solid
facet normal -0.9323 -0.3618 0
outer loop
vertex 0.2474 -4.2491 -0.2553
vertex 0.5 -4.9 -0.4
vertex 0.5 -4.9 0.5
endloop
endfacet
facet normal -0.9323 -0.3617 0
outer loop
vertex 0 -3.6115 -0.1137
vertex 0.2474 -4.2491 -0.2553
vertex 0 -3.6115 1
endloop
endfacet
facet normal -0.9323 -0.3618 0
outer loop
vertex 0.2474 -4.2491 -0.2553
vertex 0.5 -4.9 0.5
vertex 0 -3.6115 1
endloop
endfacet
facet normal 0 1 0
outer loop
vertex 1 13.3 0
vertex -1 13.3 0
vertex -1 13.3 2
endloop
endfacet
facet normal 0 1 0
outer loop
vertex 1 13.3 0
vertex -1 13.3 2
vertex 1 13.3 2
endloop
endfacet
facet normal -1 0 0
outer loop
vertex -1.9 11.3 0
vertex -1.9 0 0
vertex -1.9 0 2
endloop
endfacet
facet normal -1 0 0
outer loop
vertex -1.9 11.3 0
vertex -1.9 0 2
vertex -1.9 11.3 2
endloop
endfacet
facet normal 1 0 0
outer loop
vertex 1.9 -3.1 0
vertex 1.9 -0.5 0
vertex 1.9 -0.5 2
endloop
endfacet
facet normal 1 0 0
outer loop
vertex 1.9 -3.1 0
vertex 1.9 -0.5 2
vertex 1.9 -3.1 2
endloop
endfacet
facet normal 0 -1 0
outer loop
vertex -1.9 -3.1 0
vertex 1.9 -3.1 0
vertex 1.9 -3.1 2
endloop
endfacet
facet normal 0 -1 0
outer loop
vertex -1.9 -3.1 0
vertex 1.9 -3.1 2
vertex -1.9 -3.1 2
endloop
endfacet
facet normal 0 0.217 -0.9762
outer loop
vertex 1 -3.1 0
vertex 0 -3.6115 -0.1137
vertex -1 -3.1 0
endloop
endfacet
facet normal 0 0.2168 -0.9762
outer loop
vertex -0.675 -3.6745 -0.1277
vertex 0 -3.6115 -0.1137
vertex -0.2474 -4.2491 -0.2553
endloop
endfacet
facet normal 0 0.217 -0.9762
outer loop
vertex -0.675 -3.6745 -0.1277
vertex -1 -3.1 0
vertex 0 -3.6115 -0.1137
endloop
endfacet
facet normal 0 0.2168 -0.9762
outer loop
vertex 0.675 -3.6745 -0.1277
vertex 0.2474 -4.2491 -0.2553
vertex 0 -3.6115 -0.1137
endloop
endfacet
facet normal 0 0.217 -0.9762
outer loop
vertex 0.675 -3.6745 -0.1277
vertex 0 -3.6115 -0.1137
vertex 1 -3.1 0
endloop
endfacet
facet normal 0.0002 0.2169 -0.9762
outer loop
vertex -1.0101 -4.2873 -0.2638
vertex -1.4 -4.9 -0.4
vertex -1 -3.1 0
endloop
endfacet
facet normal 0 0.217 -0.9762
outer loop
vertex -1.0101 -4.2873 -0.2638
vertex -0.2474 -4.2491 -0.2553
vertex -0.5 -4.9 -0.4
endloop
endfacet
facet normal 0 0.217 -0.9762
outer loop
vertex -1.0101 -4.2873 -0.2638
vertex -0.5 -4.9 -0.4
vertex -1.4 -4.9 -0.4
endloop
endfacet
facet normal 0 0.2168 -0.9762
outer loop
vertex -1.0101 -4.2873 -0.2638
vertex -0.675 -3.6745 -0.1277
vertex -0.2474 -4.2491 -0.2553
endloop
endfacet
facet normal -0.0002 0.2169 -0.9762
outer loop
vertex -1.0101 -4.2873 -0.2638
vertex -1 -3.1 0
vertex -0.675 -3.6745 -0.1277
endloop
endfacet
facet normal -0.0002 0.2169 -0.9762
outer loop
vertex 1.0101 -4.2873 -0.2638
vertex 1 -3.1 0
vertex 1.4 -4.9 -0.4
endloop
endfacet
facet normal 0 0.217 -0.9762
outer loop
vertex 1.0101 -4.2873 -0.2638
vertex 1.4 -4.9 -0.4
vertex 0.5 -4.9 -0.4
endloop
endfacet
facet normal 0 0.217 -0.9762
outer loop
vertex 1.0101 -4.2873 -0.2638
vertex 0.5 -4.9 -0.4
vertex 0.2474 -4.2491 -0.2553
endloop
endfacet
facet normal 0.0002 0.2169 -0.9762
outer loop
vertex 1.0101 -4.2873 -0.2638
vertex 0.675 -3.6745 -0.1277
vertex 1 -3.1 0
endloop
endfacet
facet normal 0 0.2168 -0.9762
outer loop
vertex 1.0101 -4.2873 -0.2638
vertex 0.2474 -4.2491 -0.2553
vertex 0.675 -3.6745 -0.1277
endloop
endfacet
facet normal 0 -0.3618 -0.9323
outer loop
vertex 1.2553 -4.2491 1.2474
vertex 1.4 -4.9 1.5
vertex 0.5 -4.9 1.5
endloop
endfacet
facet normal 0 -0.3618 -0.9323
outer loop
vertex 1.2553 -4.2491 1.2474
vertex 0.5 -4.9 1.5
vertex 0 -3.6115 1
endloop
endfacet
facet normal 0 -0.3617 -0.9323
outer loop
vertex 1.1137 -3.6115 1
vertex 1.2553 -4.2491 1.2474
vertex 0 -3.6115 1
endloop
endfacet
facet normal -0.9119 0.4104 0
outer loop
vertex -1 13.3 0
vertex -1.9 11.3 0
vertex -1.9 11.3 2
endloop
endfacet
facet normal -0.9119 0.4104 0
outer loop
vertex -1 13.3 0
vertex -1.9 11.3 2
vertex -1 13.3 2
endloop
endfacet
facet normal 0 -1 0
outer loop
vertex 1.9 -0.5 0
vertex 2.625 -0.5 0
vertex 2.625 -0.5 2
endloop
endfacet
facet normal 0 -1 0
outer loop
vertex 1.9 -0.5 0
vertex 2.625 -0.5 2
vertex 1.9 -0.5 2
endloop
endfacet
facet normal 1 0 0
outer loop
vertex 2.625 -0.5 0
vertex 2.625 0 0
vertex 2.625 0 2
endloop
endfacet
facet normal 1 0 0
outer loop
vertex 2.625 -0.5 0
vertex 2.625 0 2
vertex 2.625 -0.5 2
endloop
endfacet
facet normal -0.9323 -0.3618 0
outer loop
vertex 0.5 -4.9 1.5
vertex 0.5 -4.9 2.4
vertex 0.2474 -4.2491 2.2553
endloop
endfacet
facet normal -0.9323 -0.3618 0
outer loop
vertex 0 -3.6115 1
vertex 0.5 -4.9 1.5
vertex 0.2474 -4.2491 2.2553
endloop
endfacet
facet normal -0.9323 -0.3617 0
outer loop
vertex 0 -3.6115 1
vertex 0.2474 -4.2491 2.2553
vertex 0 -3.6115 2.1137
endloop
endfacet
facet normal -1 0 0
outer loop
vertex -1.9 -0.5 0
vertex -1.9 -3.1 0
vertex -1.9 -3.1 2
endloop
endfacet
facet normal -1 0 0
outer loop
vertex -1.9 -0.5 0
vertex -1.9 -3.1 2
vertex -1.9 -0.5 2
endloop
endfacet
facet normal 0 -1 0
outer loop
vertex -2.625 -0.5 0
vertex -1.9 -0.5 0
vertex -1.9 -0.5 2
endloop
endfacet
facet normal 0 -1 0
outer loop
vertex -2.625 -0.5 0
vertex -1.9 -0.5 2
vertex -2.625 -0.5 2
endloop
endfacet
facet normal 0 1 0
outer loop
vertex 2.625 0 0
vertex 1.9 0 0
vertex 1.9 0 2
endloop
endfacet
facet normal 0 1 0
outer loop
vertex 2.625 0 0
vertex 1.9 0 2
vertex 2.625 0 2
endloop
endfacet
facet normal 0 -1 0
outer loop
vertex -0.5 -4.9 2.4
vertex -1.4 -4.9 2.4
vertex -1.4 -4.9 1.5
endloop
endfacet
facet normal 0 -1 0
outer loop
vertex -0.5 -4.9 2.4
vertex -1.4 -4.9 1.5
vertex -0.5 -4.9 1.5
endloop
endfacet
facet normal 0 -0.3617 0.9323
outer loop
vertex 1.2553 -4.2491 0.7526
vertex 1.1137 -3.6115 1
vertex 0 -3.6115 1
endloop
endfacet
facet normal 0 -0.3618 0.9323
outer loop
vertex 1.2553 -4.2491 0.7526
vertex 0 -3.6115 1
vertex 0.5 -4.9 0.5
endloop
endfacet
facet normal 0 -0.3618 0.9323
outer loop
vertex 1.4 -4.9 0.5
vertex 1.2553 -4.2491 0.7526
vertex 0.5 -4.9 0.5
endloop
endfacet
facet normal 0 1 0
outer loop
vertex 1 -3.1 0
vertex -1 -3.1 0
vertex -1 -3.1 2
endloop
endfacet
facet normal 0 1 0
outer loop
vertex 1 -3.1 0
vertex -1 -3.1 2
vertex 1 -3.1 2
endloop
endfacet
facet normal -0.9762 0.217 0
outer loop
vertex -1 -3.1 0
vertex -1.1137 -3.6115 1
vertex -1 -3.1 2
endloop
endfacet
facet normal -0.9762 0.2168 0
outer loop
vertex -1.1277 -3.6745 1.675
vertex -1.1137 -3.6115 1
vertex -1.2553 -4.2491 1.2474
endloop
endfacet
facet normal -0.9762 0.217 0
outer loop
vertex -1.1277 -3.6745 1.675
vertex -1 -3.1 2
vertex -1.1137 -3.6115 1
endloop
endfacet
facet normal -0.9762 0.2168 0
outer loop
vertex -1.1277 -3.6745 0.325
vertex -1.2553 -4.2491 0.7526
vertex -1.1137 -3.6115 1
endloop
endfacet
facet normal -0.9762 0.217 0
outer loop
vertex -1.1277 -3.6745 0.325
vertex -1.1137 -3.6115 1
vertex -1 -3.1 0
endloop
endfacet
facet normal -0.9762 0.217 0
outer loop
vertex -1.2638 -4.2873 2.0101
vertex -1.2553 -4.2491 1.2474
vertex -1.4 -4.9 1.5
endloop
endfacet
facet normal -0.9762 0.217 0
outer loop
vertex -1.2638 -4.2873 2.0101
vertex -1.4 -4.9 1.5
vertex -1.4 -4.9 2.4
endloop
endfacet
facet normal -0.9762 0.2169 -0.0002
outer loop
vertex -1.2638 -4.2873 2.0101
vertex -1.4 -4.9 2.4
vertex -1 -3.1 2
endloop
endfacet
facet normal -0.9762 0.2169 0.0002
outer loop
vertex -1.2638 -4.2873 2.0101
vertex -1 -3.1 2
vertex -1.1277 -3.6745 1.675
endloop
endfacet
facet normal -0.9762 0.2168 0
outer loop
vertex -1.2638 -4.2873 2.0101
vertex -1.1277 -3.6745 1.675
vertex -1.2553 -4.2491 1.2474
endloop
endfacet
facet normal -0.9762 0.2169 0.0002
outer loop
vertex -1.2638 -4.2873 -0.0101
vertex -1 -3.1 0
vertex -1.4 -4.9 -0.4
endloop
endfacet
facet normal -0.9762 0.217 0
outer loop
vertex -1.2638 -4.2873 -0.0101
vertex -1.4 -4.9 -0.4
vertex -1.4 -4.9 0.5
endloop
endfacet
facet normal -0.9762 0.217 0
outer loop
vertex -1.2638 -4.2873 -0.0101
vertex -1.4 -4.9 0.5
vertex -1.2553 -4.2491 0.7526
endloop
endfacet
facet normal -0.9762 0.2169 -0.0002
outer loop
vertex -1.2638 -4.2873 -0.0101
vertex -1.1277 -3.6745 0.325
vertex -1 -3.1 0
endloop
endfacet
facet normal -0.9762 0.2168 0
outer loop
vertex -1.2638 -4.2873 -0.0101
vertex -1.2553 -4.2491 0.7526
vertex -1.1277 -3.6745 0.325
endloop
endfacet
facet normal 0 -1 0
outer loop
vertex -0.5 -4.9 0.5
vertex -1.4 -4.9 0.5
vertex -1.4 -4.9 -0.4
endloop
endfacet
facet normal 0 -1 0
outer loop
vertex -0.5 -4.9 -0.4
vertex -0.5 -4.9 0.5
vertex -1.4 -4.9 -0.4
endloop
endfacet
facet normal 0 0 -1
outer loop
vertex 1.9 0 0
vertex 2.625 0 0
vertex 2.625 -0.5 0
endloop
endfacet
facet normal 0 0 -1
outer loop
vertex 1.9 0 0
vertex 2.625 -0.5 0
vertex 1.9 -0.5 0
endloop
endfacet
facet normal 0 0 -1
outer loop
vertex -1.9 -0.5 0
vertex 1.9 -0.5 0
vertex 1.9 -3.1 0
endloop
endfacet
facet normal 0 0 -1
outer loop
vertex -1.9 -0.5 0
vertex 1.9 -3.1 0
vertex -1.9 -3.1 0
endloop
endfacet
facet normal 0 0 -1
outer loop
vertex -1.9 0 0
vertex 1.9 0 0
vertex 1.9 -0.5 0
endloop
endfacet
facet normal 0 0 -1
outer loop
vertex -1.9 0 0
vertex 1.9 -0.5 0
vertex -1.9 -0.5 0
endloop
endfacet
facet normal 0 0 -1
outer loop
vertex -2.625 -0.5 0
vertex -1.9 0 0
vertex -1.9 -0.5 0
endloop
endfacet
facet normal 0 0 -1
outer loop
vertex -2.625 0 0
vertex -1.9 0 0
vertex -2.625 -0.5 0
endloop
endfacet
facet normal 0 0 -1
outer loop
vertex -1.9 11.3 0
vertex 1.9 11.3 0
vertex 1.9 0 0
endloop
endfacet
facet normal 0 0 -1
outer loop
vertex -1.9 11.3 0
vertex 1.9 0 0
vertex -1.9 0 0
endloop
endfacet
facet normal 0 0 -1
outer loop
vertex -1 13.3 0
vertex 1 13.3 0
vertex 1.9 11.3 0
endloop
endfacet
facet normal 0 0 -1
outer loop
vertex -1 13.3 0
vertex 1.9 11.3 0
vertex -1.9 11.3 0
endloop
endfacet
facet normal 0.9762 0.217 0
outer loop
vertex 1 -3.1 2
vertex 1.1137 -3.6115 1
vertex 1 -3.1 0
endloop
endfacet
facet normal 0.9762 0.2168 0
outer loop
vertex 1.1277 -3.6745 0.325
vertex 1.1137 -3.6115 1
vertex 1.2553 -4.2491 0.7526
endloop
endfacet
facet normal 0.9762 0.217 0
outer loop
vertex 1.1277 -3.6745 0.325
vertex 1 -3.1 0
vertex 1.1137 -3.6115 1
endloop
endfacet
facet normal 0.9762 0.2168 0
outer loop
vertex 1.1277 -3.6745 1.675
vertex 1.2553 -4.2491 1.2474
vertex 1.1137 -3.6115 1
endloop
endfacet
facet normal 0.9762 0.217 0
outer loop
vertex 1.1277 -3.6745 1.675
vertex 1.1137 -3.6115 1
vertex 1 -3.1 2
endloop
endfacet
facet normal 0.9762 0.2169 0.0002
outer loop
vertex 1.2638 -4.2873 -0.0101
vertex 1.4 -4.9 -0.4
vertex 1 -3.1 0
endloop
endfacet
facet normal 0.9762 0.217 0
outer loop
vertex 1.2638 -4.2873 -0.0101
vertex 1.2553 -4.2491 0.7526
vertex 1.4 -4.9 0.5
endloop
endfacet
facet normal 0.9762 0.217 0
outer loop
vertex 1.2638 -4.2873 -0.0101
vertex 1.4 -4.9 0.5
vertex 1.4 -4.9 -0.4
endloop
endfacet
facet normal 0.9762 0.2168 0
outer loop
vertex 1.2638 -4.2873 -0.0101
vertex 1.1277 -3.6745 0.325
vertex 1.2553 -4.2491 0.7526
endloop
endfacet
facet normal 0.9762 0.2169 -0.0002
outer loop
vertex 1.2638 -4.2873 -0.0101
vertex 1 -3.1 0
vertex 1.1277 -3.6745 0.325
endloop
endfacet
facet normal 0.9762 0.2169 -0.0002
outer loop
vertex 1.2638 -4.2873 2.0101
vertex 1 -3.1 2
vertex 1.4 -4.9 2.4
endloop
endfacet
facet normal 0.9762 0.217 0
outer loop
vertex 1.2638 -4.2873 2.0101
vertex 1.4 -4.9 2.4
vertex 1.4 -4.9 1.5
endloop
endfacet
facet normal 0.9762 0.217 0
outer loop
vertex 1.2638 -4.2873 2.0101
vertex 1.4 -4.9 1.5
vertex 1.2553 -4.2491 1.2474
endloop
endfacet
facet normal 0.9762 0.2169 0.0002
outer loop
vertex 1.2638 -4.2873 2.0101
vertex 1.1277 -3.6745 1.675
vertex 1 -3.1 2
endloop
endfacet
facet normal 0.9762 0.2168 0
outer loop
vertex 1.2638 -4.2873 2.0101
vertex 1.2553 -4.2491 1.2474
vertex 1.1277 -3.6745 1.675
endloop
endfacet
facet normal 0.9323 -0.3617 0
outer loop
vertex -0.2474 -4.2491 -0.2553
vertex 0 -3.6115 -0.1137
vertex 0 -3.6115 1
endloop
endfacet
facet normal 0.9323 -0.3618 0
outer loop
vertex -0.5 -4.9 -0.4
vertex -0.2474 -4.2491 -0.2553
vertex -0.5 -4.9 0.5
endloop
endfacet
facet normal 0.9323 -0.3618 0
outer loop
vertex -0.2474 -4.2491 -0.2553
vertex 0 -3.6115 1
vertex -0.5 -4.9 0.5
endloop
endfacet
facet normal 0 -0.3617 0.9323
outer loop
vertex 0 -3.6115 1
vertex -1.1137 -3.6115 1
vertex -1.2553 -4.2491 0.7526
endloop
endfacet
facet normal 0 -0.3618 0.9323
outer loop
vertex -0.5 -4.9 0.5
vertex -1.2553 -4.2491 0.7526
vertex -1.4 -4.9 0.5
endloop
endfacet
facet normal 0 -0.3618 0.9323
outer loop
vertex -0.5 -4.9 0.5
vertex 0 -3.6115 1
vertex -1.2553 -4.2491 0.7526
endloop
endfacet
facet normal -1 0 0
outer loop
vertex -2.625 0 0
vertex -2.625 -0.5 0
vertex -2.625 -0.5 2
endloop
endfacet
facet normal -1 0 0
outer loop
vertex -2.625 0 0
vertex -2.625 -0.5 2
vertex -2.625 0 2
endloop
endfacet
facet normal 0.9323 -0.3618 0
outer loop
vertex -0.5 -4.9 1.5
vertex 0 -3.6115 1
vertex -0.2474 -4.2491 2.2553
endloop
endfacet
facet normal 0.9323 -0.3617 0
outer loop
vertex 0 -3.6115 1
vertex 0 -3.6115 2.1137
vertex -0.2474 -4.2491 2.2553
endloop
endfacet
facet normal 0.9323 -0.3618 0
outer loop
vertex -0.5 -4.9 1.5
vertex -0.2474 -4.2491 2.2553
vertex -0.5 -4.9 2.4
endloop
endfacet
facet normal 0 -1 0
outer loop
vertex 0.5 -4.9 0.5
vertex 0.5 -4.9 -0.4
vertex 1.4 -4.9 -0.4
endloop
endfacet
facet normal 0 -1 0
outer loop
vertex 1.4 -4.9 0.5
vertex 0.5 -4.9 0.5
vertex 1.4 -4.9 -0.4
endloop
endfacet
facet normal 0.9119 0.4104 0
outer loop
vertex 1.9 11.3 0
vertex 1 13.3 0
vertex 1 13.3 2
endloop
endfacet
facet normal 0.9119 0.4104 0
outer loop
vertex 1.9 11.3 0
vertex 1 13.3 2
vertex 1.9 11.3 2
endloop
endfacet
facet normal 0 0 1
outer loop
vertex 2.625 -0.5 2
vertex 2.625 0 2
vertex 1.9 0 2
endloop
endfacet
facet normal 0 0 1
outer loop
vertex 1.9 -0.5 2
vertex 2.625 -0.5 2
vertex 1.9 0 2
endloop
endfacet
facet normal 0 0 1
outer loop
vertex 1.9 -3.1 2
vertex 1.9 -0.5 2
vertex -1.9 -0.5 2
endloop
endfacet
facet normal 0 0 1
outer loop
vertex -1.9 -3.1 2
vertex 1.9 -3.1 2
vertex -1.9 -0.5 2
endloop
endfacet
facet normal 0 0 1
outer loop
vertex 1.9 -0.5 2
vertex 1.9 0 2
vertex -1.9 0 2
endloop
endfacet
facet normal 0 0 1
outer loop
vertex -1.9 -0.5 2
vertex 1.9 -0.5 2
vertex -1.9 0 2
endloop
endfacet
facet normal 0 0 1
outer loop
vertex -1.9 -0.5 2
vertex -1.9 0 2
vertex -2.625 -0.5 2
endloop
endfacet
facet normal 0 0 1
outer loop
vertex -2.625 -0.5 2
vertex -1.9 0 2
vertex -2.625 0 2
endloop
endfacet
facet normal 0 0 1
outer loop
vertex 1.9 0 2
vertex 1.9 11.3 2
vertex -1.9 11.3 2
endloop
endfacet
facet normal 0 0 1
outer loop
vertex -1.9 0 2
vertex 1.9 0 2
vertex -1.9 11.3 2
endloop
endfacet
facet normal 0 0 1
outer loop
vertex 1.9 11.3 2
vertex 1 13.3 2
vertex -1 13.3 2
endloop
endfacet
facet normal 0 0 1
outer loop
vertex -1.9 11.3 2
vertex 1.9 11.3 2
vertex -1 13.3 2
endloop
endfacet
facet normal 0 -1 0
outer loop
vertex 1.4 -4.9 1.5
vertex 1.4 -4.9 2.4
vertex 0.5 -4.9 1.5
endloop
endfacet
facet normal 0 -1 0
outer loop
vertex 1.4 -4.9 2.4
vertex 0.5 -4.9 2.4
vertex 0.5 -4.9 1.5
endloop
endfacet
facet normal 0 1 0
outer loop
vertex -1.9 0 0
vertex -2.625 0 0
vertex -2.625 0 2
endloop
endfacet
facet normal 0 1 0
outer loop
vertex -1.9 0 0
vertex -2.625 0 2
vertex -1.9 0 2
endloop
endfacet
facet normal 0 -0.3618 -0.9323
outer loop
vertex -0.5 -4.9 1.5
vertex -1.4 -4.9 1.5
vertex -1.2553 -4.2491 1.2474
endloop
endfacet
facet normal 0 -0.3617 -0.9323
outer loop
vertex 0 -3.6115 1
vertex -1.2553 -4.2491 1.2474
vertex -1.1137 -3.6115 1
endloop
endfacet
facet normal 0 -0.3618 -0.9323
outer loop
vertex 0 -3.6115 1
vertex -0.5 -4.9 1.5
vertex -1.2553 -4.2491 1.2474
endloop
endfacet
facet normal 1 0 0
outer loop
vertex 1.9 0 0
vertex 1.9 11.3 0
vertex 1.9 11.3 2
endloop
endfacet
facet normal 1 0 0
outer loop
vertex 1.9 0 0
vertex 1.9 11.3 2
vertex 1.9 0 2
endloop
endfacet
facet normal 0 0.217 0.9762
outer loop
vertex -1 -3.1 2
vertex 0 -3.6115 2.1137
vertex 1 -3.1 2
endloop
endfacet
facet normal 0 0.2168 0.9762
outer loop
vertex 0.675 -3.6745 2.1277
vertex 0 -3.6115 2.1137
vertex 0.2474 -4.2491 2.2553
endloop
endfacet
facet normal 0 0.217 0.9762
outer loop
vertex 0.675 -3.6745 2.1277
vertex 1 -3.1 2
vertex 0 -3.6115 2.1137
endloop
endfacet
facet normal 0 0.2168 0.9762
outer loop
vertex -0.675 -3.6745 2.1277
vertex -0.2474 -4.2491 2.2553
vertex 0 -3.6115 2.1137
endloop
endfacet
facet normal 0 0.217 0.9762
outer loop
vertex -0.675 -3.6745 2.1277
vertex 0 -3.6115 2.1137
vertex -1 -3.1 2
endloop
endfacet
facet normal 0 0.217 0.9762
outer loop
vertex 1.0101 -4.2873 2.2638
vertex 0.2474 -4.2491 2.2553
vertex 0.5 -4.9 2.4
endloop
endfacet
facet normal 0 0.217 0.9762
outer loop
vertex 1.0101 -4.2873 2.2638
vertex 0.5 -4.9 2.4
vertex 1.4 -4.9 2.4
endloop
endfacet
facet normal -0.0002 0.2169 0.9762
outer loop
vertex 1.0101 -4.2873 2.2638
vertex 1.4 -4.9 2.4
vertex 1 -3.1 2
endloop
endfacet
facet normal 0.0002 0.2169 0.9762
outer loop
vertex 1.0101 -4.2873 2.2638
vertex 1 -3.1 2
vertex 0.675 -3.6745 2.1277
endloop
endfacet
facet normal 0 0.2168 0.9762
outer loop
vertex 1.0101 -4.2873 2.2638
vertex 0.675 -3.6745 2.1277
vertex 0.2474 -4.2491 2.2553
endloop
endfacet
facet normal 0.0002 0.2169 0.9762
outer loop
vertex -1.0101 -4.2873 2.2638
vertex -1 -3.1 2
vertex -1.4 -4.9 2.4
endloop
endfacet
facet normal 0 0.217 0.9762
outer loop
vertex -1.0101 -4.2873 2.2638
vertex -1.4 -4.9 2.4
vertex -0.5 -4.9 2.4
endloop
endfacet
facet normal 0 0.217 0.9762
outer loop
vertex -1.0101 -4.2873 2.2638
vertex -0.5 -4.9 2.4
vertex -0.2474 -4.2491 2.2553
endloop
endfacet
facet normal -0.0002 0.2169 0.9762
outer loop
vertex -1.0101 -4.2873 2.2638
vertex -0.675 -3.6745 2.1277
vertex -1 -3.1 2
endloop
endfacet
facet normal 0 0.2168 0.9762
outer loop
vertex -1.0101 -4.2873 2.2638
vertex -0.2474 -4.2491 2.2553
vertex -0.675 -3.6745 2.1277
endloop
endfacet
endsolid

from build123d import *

# Parameters (mm, degrees)
BOSS_EXTRUDE1_DEPTH     = 2
SKETCH2_W               = 2
SKETCH2_H               = 2
SKETCH3_W               = 2.8
SKETCH3_H               = 2.8
CUT_EXTRUDE1_DEPTH      = 1.6000001
CUT_EXTRUDE1_DEPTH_BACK = 3.2000001
CUT_EXTRUDE2_DEPTH      = 5.425
CUT_EXTRUDE2_DEPTH_BACK = 1.825


with BuildPart() as part:
    # Sketch1 → Boss-Extrude1 (new body)
    with BuildSketch(Plane.XY):
        Polygon((1.9, 0), (2.625, 0), (2.625, -0.5), (1.9, -0.5), (1.9, -3.1), (-1.9, -3.1), (-1.9, -0.5), (-2.625, -0.5), (-2.625, 0), (-1.9, 0), (-1.9, 11.3), (-1, 13.3), (1, 13.3), (1.9, 11.3), align=None)
    extrude(amount=BOSS_EXTRUDE1_DEPTH)


with BuildPart() as body_2:
    # Sketch2 → Loft1 section 0
    with BuildSketch(Plane.XZ.offset(3.1)):
        with Locations((0, 1)):
            Rectangle(SKETCH2_W, SKETCH2_H)
    # Sketch3 → Loft1 section 1
    with BuildSketch(Plane(origin=(0, -4.9, 0), x_dir=(-1, 0, 0), z_dir=(0, -1, 0))):
        with Locations((0, -1)):
            Rectangle(SKETCH3_W, SKETCH3_H)
    loft()

    # Sketch4 → Cut-Extrude1 (cut, two sides)
    with BuildSketch(Plane.XY.offset(1.8)) as cut_extrude1_sk:
        Polygon((0, -3.611513086), (-0.5, -4.9), (0.5, -4.9), align=None)
    extrude(amount=CUT_EXTRUDE1_DEPTH, mode=Mode.SUBTRACT)
    extrude(cut_extrude1_sk.sketch, amount=-CUT_EXTRUDE1_DEPTH_BACK, mode=Mode.SUBTRACT)

    # Sketch5 → Cut-Extrude2 (cut, two sides)
    with BuildSketch(Plane(origin=(1.8, 0, -1.8), x_dir=(0, 0, 1), z_dir=(-1, 0, 0))) as cut_extrude2_sk:
        Polygon((2.8, -3.611513086), (2.3, -4.9), (3.3, -4.9), align=None)
    extrude(amount=CUT_EXTRUDE2_DEPTH, mode=Mode.SUBTRACT)
    extrude(cut_extrude2_sk.sketch, amount=-CUT_EXTRUDE2_DEPTH_BACK, mode=Mode.SUBTRACT)


solid = Compound([part.part, body_2.part])
